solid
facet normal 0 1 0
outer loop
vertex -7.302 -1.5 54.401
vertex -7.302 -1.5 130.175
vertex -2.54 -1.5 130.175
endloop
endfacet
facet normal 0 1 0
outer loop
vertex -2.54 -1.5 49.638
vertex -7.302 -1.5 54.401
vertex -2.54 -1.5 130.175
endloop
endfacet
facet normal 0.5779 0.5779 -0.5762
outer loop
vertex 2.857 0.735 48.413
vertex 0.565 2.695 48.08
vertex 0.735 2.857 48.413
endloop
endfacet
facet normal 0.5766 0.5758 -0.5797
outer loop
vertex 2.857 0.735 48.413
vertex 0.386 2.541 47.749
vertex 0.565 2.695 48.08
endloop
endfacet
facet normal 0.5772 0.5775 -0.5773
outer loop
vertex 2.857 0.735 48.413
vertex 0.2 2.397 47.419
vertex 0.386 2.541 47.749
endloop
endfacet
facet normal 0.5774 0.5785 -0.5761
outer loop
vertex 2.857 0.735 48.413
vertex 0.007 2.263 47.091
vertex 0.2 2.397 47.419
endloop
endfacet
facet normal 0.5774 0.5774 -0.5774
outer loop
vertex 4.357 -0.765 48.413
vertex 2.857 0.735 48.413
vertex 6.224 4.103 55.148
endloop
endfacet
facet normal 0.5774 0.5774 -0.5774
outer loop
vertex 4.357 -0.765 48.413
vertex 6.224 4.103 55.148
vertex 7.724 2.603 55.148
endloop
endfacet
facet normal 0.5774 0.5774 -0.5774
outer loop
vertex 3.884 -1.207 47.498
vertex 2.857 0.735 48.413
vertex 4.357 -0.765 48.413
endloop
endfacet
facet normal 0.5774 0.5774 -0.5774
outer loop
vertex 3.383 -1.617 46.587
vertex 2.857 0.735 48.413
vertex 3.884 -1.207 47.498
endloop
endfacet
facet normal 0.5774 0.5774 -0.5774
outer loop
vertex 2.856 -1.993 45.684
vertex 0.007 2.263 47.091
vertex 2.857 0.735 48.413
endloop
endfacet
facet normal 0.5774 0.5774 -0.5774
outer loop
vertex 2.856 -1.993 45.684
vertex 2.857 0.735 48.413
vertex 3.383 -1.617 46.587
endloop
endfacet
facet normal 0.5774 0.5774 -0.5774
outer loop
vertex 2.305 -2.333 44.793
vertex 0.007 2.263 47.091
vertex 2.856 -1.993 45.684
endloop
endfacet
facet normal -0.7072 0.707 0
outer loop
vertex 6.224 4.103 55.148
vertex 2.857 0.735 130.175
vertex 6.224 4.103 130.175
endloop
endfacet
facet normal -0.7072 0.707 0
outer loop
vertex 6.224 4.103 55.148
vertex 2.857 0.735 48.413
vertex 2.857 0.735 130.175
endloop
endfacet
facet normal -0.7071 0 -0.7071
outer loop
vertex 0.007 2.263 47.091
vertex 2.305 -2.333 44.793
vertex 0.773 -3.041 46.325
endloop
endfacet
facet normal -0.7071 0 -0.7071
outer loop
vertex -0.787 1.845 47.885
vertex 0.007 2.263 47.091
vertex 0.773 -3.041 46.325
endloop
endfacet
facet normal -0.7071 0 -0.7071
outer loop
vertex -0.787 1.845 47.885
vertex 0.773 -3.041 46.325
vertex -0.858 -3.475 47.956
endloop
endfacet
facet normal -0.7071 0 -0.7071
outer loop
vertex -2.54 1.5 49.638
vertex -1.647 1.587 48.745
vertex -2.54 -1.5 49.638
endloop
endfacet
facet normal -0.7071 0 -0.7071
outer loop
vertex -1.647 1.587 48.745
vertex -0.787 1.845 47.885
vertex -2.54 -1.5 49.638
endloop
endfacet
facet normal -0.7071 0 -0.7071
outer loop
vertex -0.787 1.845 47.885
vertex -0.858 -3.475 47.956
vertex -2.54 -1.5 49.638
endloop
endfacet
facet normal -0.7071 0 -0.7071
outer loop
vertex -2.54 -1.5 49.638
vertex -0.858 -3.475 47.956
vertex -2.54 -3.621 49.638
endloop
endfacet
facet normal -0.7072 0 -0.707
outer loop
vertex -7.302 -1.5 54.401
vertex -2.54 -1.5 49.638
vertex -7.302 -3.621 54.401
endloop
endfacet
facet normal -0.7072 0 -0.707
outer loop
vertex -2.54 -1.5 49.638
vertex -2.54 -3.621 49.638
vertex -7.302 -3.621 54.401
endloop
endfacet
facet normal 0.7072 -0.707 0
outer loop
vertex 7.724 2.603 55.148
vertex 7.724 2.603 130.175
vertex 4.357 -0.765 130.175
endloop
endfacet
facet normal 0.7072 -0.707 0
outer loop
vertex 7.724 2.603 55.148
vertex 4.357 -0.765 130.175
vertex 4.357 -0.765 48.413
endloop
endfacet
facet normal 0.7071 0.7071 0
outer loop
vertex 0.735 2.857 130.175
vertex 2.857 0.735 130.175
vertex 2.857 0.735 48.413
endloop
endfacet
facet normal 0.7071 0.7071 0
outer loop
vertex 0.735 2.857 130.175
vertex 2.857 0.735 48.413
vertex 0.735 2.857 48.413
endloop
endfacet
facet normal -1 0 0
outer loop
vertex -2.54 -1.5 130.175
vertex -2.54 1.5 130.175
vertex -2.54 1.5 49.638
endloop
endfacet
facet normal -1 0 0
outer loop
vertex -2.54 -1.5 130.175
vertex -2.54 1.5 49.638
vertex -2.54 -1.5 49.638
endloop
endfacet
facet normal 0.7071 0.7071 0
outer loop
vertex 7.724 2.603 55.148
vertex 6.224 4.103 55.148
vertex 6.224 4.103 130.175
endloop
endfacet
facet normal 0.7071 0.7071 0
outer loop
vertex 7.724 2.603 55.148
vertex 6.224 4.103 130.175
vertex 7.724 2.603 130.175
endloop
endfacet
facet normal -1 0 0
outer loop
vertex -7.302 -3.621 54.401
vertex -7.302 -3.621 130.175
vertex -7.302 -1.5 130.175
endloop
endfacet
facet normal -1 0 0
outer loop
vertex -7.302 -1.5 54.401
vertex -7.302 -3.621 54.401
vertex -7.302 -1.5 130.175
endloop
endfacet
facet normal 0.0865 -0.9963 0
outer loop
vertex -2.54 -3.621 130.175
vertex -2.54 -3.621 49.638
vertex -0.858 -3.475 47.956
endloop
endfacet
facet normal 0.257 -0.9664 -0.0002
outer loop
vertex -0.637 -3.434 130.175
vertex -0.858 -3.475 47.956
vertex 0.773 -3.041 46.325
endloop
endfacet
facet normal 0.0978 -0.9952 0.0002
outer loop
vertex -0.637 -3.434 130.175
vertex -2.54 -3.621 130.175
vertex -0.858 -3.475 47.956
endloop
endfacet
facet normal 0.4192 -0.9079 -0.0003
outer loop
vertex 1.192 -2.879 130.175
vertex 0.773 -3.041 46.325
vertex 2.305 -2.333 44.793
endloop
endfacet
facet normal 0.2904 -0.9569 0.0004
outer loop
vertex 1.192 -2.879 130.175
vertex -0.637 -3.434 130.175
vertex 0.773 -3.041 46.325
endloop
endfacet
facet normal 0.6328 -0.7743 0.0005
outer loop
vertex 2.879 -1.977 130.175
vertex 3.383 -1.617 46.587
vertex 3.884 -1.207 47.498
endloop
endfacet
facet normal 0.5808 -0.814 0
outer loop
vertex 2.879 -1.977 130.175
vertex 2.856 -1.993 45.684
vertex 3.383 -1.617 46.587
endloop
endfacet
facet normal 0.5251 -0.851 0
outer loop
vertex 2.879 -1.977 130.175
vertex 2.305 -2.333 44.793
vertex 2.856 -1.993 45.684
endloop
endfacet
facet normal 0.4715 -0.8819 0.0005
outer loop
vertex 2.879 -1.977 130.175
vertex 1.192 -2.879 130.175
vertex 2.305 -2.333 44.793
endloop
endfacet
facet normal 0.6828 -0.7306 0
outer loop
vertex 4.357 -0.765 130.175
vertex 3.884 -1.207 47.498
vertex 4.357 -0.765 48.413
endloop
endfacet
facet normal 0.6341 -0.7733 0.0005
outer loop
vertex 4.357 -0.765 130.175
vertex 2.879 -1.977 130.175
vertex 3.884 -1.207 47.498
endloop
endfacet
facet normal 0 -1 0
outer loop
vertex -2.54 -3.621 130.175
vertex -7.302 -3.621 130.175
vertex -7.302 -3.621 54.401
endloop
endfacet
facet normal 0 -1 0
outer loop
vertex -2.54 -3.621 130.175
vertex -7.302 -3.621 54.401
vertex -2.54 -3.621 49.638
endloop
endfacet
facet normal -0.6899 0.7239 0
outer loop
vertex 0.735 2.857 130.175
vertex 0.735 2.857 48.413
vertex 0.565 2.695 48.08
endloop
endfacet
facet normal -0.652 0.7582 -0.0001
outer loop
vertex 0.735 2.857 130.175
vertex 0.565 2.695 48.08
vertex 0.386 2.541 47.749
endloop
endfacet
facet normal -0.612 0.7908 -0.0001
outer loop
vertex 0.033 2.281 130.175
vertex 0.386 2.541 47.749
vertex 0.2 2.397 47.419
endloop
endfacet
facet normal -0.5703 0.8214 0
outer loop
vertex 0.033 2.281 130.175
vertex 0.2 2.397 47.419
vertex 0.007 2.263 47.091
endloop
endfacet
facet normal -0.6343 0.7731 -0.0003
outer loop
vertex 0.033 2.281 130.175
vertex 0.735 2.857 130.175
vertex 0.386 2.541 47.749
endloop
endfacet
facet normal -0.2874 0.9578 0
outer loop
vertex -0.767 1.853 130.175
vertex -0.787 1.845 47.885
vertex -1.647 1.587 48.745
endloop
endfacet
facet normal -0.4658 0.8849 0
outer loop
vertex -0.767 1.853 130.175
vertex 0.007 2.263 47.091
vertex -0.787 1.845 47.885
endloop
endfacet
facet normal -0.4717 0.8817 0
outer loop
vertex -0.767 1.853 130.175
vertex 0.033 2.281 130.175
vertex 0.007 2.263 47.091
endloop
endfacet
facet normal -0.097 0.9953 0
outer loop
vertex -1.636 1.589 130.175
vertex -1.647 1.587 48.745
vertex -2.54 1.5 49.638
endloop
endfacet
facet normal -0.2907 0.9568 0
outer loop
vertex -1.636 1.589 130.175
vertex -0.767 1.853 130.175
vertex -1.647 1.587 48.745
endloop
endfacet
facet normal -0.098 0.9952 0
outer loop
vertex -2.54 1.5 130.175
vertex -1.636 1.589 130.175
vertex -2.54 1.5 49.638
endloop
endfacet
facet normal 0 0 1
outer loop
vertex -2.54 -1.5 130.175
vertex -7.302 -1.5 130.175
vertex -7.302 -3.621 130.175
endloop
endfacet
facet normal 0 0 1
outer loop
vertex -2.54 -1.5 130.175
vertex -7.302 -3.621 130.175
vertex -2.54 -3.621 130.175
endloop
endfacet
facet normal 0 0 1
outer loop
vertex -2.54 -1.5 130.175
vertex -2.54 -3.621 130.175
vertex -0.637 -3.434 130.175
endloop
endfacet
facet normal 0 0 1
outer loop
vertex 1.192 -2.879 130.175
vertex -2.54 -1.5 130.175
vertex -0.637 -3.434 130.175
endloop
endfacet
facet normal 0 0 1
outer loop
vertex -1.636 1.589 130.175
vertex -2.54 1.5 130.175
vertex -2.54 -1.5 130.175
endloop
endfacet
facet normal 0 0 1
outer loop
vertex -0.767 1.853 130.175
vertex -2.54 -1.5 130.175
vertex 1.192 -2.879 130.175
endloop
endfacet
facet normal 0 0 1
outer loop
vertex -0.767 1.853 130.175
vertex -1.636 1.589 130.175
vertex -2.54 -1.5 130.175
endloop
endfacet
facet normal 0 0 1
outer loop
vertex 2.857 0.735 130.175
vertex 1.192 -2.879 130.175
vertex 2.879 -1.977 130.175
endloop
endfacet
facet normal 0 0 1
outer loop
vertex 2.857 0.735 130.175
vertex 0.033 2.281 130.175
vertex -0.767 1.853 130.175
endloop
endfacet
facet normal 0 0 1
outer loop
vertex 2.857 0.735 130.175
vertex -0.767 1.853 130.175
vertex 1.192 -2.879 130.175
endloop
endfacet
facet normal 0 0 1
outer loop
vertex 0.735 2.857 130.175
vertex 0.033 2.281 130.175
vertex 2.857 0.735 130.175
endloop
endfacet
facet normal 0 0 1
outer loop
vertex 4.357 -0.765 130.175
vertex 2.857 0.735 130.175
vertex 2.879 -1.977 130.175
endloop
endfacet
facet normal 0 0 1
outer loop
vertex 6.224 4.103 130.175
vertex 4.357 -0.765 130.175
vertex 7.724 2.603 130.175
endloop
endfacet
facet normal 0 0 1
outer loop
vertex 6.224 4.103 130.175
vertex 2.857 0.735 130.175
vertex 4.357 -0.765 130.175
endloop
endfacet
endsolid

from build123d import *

# Parameters (mm, degrees)
SKETCH7_W               = 4.7625
SKETCH7_H               = 2.12122512
BOSS_EXTRUDE2_DEPTH     = 130.175
BOSS_EXTRUDE3_DEPTH     = 130.175
BOSS_EXTRUDE4_DEPTH     = 130.175
CUT_EXTRUDE1_DEPTH      = 1
CUT_EXTRUDE1_DEPTH_BACK = 118.807865064
SKETCH18_W              = 254
SKETCH18_H              = 254
CUT_EXTRUDE2_DEPTH      = 80.261506


with BuildPart() as part:
    # Sketch7 → Boss-Extrude2 (new body, symmetric)
    with BuildSketch(Plane.XY):
        with Locations((-4.92125, -2.560612608)):
            Rectangle(SKETCH7_W, SKETCH7_H)
    extrude(amount=BOSS_EXTRUDE2_DEPTH, both=True)



with BuildPart() as body_2:
    # Sketch8 → Boss-Extrude3 (new body, symmetric)
    with BuildSketch(Plane.XY):
        Polygon((2.85671143, 0.735391018), (6.224307475, 4.102987064), (7.724240142, 2.603054397), (4.356644097, -0.764541648), align=None)
    extrude(amount=BOSS_EXTRUDE3_DEPTH, both=True)


with BuildPart() as part_1:
    add(part.part)

    add(body_2.part)  # Boss-Extrude4 merges body 2
    # Sketch11 → Boss-Extrude4 (add, symmetric)
    with BuildSketch(Plane.XY):
        with BuildLine():
            Line((-2.54, -1.500000048), (-7.3025, -1.500000048))
            Line((-7.3025, -1.500000048), (-7.3025, -3.621225168))
            Line((-7.3025, -3.621225168), (-2.54, -3.621225168))
            ThreePointArc((-2.54, -3.621225168), (1.192436889, -2.87879731), (4.356644097, -0.764541648))
            Line((4.356644097, -0.764541648), (7.724240142, 2.603054397))
            Line((7.724240142, 2.603054397), (6.224307475, 4.102987064))
            Line((6.224307475, 4.102987064), (2.85671143, 0.735391018))
            Line((2.85671143, 0.735391018), (0.735391018, 2.85671143))
            ThreePointArc((0.735391018, 2.85671143), (-0.767371154, 1.852597848), (-2.54, 1.500000048))
            Line((-2.54, 1.500000048), (-2.54, -1.500000048))
        make_face()
    extrude(amount=BOSS_EXTRUDE4_DEPTH, both=True)

    # Sketch17 → Cut-Extrude1 (cut, two sides)
    with BuildSketch(Plane(origin=(47.098102576, -113.704878, 0), x_dir=(-1, 0, 0), z_dir=(0, -1, 0))) as cut_extrude1_sk:
        Polygon((-898.025612107, 898.025612107), (898.025612107, -898.025612107), (2694.076836321, 898.025612107), (898.025612107, 2694.076836321), align=None)
    extrude(amount=CUT_EXTRUDE1_DEPTH, mode=Mode.SUBTRACT)
    extrude(cut_extrude1_sk.sketch, amount=-CUT_EXTRUDE1_DEPTH_BACK, mode=Mode.SUBTRACT)

    # Sketch18 → Cut-Extrude2 (cut)
    with BuildSketch(Plane(origin=(47.098102576, 47.098102576, 0), x_dir=(0.816496581, -0.40824829, 0.40824829), z_dir=(0.577350269, 0.577350269, -0.577350269))):
        Rectangle(SKETCH18_W, SKETCH18_H)
    extrude(amount=-CUT_EXTRUDE2_DEPTH, mode=Mode.SUBTRACT)


solid = part_1.part
